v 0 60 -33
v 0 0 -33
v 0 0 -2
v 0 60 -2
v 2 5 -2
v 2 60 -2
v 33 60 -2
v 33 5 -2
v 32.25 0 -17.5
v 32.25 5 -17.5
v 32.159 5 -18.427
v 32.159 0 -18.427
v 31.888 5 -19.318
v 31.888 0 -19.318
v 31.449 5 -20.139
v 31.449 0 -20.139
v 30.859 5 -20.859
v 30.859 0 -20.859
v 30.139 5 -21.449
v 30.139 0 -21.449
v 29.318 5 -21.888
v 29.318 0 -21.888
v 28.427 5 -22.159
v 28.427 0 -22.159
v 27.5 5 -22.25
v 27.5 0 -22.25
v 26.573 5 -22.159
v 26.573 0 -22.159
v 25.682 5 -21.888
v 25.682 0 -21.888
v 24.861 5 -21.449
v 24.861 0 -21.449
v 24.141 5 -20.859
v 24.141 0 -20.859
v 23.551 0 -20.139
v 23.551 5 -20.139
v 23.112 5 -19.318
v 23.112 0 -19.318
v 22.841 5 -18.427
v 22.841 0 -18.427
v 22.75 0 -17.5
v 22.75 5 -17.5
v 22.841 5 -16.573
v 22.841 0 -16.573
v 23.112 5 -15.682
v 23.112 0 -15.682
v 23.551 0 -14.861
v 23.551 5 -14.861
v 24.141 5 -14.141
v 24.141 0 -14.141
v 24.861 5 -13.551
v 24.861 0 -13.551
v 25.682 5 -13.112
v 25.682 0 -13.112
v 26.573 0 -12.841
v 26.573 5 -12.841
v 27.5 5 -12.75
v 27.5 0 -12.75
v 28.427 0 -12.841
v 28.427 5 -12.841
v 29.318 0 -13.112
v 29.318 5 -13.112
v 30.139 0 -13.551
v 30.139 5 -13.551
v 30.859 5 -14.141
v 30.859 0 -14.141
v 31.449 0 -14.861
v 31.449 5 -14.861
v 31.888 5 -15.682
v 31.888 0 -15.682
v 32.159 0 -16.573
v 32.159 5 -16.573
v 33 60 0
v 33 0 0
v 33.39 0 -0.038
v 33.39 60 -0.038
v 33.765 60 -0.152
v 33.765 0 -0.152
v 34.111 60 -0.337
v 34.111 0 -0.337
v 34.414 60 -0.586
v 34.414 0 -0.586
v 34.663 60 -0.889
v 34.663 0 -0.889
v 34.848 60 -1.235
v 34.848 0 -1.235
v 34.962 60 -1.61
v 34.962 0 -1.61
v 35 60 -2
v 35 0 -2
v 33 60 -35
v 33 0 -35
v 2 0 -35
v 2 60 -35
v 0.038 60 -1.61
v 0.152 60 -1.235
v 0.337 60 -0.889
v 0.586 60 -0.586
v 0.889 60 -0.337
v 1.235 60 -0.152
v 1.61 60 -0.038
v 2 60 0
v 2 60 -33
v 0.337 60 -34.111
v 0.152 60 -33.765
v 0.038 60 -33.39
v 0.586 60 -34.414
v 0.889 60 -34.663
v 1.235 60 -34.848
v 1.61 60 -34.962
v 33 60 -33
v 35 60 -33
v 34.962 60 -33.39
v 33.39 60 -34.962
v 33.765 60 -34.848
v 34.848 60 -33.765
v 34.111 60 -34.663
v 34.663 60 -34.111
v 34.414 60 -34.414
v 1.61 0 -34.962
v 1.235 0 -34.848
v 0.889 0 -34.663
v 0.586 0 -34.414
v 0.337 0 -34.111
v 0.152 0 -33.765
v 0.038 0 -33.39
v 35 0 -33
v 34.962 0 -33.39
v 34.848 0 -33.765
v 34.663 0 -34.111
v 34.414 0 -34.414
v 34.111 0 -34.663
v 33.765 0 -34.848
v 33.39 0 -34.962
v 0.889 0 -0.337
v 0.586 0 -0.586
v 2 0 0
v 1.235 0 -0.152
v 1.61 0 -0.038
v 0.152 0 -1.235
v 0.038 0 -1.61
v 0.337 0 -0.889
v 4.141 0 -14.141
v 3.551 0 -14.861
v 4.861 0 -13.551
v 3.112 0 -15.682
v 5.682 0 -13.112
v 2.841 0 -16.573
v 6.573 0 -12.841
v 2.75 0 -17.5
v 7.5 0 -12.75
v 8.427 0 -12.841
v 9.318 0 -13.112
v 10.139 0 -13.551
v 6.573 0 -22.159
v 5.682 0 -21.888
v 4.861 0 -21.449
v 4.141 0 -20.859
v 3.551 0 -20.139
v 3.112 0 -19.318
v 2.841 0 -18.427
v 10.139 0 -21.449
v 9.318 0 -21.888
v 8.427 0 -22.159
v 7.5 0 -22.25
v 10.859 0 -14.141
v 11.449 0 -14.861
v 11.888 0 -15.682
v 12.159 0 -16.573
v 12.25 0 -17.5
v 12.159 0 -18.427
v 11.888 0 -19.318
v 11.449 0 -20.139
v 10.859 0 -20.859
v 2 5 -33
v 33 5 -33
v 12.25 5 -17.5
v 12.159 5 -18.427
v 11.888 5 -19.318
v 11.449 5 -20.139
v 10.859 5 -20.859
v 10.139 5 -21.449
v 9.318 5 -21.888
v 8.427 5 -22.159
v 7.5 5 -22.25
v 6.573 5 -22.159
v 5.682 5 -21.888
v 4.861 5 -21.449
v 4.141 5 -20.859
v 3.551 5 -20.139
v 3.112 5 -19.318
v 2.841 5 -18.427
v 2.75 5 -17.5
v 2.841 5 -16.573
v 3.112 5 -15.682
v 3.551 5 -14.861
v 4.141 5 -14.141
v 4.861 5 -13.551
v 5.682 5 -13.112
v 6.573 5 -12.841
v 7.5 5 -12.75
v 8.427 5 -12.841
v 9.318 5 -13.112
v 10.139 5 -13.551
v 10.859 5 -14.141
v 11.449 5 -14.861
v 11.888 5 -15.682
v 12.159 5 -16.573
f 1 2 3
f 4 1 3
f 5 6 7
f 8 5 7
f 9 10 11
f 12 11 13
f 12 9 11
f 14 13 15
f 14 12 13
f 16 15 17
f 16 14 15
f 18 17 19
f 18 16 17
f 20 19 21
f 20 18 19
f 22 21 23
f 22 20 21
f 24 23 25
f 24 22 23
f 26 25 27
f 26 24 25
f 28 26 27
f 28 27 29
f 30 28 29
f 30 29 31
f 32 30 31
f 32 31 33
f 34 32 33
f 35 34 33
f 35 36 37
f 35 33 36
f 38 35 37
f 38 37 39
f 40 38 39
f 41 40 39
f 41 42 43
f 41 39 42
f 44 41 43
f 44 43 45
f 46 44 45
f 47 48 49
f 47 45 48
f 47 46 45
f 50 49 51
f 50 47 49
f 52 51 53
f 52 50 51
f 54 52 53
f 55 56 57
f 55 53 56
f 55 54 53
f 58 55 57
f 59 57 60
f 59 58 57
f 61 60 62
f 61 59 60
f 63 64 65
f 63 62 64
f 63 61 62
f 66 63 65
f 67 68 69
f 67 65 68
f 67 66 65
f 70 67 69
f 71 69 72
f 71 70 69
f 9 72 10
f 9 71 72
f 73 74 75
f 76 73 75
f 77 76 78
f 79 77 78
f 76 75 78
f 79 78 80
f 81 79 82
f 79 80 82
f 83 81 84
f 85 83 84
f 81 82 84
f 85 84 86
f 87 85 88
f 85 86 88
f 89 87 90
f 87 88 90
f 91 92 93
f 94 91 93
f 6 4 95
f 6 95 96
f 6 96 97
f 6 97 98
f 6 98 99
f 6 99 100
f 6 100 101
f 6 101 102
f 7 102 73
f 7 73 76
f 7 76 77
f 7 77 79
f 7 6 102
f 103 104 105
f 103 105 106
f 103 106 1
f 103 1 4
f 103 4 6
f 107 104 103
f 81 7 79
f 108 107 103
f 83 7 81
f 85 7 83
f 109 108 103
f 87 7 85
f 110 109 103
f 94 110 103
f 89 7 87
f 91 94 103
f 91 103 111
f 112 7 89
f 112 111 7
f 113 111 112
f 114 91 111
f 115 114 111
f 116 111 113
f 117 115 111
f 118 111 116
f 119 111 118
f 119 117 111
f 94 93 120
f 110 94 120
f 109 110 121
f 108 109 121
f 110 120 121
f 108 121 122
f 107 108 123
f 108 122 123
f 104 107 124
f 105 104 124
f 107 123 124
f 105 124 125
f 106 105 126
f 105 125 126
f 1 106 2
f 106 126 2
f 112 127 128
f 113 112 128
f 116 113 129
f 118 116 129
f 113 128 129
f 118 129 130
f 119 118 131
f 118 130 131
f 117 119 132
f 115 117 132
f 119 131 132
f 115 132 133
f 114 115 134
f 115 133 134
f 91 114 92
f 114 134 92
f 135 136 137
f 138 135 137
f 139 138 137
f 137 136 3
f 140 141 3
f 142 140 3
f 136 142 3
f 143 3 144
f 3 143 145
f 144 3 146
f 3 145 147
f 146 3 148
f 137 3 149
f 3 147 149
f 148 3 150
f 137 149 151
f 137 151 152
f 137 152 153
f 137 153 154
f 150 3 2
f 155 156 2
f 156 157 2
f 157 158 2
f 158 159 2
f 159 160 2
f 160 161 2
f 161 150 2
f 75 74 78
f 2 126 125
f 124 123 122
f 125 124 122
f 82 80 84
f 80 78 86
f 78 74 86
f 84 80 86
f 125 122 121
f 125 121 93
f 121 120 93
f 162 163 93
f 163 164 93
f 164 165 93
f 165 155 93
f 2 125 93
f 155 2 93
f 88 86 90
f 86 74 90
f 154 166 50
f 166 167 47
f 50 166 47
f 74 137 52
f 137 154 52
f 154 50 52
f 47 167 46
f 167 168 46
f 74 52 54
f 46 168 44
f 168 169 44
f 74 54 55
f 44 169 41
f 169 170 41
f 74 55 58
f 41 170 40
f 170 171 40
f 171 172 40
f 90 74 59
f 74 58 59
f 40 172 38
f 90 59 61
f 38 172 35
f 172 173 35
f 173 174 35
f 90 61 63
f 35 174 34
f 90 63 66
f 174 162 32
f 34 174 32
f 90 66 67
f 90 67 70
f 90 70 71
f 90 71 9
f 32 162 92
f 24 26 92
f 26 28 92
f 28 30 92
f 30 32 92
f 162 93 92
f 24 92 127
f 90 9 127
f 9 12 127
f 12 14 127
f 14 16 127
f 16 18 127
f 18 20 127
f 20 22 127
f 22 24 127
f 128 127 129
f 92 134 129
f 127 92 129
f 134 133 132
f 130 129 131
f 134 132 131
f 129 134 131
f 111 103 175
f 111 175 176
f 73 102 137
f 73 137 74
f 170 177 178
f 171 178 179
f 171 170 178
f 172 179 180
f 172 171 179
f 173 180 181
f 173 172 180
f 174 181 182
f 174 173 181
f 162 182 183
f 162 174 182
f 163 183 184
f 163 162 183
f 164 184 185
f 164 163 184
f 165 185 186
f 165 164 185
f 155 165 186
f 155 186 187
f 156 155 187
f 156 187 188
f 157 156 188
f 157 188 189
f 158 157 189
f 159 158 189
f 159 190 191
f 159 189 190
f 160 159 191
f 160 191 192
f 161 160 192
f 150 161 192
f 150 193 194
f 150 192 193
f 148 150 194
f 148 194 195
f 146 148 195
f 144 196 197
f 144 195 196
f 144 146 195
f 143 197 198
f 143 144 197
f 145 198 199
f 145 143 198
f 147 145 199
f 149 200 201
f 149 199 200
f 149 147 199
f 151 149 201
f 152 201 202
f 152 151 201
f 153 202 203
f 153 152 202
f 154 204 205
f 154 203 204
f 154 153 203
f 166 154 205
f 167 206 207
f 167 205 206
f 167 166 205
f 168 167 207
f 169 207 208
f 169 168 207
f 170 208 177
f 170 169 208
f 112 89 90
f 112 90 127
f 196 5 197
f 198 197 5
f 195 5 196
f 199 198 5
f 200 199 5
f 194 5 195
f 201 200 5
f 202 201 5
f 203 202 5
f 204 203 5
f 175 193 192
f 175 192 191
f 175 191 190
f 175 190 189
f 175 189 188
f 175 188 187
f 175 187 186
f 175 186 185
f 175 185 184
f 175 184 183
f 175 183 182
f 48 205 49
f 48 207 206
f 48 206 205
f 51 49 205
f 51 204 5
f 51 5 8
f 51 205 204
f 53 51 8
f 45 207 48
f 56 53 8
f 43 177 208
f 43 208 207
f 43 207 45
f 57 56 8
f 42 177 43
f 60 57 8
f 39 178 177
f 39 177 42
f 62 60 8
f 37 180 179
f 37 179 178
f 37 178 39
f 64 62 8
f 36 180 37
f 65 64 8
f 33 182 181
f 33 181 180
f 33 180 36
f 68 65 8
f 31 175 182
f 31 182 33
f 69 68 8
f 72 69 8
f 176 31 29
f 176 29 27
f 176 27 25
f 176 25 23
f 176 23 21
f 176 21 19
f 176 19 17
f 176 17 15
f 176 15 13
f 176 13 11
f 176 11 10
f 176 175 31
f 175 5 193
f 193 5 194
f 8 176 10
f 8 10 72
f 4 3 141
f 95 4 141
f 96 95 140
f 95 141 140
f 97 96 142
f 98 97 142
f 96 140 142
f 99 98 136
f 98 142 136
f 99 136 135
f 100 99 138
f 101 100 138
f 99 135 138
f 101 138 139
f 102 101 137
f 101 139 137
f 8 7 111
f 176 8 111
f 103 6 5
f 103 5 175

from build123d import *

# Parameters (mm, degrees)
SKETCH1_R           = 4.75
BOSS_EXTRUDE1_DEPTH = 60
SKETCH2_W           = 31
SKETCH2_H           = 31
CUT_EXTRUDE1_DEPTH  = 55


with BuildPart() as part:
    # Sketch1 → Boss-Extrude1 (new body)
    with BuildSketch(Plane(origin=(0, 0, 0), x_dir=(1, 0, 0), z_dir=(0, 1, 0))):
        with BuildLine():
            Line((2, 0), (33, 0))
            ThreePointArc((33, 0), (34.414213562, 0.585786438), (35, 2))
            Line((35, 2), (35, 33))
            ThreePointArc((35, 33), (34.414213562, 34.414213562), (33, 35))
            Line((33, 35), (2, 35))
            ThreePointArc((2, 35), (0.585786438, 34.414213562), (0, 33))
            Line((0, 33), (0, 2))
            ThreePointArc((0, 2), (0.585786438, 0.585786438), (2, 0))
        make_face()
        with Locations((7.5, 17.5)):
            Circle(SKETCH1_R, mode=Mode.SUBTRACT)
        with Locations((27.5, 17.5)):
            Circle(SKETCH1_R, mode=Mode.SUBTRACT)
    extrude(amount=BOSS_EXTRUDE1_DEPTH)

    # Sketch2 → Cut-Extrude1 (cut)
    with BuildSketch(Plane(origin=(0, 60, 0), x_dir=(1, 0, 0), z_dir=(0, 1, 0))):
        with Locations((17.5, 17.5)):
            Rectangle(SKETCH2_W, SKETCH2_H)
    extrude(amount=-CUT_EXTRUDE1_DEPTH, mode=Mode.SUBTRACT)


solid = part.part
